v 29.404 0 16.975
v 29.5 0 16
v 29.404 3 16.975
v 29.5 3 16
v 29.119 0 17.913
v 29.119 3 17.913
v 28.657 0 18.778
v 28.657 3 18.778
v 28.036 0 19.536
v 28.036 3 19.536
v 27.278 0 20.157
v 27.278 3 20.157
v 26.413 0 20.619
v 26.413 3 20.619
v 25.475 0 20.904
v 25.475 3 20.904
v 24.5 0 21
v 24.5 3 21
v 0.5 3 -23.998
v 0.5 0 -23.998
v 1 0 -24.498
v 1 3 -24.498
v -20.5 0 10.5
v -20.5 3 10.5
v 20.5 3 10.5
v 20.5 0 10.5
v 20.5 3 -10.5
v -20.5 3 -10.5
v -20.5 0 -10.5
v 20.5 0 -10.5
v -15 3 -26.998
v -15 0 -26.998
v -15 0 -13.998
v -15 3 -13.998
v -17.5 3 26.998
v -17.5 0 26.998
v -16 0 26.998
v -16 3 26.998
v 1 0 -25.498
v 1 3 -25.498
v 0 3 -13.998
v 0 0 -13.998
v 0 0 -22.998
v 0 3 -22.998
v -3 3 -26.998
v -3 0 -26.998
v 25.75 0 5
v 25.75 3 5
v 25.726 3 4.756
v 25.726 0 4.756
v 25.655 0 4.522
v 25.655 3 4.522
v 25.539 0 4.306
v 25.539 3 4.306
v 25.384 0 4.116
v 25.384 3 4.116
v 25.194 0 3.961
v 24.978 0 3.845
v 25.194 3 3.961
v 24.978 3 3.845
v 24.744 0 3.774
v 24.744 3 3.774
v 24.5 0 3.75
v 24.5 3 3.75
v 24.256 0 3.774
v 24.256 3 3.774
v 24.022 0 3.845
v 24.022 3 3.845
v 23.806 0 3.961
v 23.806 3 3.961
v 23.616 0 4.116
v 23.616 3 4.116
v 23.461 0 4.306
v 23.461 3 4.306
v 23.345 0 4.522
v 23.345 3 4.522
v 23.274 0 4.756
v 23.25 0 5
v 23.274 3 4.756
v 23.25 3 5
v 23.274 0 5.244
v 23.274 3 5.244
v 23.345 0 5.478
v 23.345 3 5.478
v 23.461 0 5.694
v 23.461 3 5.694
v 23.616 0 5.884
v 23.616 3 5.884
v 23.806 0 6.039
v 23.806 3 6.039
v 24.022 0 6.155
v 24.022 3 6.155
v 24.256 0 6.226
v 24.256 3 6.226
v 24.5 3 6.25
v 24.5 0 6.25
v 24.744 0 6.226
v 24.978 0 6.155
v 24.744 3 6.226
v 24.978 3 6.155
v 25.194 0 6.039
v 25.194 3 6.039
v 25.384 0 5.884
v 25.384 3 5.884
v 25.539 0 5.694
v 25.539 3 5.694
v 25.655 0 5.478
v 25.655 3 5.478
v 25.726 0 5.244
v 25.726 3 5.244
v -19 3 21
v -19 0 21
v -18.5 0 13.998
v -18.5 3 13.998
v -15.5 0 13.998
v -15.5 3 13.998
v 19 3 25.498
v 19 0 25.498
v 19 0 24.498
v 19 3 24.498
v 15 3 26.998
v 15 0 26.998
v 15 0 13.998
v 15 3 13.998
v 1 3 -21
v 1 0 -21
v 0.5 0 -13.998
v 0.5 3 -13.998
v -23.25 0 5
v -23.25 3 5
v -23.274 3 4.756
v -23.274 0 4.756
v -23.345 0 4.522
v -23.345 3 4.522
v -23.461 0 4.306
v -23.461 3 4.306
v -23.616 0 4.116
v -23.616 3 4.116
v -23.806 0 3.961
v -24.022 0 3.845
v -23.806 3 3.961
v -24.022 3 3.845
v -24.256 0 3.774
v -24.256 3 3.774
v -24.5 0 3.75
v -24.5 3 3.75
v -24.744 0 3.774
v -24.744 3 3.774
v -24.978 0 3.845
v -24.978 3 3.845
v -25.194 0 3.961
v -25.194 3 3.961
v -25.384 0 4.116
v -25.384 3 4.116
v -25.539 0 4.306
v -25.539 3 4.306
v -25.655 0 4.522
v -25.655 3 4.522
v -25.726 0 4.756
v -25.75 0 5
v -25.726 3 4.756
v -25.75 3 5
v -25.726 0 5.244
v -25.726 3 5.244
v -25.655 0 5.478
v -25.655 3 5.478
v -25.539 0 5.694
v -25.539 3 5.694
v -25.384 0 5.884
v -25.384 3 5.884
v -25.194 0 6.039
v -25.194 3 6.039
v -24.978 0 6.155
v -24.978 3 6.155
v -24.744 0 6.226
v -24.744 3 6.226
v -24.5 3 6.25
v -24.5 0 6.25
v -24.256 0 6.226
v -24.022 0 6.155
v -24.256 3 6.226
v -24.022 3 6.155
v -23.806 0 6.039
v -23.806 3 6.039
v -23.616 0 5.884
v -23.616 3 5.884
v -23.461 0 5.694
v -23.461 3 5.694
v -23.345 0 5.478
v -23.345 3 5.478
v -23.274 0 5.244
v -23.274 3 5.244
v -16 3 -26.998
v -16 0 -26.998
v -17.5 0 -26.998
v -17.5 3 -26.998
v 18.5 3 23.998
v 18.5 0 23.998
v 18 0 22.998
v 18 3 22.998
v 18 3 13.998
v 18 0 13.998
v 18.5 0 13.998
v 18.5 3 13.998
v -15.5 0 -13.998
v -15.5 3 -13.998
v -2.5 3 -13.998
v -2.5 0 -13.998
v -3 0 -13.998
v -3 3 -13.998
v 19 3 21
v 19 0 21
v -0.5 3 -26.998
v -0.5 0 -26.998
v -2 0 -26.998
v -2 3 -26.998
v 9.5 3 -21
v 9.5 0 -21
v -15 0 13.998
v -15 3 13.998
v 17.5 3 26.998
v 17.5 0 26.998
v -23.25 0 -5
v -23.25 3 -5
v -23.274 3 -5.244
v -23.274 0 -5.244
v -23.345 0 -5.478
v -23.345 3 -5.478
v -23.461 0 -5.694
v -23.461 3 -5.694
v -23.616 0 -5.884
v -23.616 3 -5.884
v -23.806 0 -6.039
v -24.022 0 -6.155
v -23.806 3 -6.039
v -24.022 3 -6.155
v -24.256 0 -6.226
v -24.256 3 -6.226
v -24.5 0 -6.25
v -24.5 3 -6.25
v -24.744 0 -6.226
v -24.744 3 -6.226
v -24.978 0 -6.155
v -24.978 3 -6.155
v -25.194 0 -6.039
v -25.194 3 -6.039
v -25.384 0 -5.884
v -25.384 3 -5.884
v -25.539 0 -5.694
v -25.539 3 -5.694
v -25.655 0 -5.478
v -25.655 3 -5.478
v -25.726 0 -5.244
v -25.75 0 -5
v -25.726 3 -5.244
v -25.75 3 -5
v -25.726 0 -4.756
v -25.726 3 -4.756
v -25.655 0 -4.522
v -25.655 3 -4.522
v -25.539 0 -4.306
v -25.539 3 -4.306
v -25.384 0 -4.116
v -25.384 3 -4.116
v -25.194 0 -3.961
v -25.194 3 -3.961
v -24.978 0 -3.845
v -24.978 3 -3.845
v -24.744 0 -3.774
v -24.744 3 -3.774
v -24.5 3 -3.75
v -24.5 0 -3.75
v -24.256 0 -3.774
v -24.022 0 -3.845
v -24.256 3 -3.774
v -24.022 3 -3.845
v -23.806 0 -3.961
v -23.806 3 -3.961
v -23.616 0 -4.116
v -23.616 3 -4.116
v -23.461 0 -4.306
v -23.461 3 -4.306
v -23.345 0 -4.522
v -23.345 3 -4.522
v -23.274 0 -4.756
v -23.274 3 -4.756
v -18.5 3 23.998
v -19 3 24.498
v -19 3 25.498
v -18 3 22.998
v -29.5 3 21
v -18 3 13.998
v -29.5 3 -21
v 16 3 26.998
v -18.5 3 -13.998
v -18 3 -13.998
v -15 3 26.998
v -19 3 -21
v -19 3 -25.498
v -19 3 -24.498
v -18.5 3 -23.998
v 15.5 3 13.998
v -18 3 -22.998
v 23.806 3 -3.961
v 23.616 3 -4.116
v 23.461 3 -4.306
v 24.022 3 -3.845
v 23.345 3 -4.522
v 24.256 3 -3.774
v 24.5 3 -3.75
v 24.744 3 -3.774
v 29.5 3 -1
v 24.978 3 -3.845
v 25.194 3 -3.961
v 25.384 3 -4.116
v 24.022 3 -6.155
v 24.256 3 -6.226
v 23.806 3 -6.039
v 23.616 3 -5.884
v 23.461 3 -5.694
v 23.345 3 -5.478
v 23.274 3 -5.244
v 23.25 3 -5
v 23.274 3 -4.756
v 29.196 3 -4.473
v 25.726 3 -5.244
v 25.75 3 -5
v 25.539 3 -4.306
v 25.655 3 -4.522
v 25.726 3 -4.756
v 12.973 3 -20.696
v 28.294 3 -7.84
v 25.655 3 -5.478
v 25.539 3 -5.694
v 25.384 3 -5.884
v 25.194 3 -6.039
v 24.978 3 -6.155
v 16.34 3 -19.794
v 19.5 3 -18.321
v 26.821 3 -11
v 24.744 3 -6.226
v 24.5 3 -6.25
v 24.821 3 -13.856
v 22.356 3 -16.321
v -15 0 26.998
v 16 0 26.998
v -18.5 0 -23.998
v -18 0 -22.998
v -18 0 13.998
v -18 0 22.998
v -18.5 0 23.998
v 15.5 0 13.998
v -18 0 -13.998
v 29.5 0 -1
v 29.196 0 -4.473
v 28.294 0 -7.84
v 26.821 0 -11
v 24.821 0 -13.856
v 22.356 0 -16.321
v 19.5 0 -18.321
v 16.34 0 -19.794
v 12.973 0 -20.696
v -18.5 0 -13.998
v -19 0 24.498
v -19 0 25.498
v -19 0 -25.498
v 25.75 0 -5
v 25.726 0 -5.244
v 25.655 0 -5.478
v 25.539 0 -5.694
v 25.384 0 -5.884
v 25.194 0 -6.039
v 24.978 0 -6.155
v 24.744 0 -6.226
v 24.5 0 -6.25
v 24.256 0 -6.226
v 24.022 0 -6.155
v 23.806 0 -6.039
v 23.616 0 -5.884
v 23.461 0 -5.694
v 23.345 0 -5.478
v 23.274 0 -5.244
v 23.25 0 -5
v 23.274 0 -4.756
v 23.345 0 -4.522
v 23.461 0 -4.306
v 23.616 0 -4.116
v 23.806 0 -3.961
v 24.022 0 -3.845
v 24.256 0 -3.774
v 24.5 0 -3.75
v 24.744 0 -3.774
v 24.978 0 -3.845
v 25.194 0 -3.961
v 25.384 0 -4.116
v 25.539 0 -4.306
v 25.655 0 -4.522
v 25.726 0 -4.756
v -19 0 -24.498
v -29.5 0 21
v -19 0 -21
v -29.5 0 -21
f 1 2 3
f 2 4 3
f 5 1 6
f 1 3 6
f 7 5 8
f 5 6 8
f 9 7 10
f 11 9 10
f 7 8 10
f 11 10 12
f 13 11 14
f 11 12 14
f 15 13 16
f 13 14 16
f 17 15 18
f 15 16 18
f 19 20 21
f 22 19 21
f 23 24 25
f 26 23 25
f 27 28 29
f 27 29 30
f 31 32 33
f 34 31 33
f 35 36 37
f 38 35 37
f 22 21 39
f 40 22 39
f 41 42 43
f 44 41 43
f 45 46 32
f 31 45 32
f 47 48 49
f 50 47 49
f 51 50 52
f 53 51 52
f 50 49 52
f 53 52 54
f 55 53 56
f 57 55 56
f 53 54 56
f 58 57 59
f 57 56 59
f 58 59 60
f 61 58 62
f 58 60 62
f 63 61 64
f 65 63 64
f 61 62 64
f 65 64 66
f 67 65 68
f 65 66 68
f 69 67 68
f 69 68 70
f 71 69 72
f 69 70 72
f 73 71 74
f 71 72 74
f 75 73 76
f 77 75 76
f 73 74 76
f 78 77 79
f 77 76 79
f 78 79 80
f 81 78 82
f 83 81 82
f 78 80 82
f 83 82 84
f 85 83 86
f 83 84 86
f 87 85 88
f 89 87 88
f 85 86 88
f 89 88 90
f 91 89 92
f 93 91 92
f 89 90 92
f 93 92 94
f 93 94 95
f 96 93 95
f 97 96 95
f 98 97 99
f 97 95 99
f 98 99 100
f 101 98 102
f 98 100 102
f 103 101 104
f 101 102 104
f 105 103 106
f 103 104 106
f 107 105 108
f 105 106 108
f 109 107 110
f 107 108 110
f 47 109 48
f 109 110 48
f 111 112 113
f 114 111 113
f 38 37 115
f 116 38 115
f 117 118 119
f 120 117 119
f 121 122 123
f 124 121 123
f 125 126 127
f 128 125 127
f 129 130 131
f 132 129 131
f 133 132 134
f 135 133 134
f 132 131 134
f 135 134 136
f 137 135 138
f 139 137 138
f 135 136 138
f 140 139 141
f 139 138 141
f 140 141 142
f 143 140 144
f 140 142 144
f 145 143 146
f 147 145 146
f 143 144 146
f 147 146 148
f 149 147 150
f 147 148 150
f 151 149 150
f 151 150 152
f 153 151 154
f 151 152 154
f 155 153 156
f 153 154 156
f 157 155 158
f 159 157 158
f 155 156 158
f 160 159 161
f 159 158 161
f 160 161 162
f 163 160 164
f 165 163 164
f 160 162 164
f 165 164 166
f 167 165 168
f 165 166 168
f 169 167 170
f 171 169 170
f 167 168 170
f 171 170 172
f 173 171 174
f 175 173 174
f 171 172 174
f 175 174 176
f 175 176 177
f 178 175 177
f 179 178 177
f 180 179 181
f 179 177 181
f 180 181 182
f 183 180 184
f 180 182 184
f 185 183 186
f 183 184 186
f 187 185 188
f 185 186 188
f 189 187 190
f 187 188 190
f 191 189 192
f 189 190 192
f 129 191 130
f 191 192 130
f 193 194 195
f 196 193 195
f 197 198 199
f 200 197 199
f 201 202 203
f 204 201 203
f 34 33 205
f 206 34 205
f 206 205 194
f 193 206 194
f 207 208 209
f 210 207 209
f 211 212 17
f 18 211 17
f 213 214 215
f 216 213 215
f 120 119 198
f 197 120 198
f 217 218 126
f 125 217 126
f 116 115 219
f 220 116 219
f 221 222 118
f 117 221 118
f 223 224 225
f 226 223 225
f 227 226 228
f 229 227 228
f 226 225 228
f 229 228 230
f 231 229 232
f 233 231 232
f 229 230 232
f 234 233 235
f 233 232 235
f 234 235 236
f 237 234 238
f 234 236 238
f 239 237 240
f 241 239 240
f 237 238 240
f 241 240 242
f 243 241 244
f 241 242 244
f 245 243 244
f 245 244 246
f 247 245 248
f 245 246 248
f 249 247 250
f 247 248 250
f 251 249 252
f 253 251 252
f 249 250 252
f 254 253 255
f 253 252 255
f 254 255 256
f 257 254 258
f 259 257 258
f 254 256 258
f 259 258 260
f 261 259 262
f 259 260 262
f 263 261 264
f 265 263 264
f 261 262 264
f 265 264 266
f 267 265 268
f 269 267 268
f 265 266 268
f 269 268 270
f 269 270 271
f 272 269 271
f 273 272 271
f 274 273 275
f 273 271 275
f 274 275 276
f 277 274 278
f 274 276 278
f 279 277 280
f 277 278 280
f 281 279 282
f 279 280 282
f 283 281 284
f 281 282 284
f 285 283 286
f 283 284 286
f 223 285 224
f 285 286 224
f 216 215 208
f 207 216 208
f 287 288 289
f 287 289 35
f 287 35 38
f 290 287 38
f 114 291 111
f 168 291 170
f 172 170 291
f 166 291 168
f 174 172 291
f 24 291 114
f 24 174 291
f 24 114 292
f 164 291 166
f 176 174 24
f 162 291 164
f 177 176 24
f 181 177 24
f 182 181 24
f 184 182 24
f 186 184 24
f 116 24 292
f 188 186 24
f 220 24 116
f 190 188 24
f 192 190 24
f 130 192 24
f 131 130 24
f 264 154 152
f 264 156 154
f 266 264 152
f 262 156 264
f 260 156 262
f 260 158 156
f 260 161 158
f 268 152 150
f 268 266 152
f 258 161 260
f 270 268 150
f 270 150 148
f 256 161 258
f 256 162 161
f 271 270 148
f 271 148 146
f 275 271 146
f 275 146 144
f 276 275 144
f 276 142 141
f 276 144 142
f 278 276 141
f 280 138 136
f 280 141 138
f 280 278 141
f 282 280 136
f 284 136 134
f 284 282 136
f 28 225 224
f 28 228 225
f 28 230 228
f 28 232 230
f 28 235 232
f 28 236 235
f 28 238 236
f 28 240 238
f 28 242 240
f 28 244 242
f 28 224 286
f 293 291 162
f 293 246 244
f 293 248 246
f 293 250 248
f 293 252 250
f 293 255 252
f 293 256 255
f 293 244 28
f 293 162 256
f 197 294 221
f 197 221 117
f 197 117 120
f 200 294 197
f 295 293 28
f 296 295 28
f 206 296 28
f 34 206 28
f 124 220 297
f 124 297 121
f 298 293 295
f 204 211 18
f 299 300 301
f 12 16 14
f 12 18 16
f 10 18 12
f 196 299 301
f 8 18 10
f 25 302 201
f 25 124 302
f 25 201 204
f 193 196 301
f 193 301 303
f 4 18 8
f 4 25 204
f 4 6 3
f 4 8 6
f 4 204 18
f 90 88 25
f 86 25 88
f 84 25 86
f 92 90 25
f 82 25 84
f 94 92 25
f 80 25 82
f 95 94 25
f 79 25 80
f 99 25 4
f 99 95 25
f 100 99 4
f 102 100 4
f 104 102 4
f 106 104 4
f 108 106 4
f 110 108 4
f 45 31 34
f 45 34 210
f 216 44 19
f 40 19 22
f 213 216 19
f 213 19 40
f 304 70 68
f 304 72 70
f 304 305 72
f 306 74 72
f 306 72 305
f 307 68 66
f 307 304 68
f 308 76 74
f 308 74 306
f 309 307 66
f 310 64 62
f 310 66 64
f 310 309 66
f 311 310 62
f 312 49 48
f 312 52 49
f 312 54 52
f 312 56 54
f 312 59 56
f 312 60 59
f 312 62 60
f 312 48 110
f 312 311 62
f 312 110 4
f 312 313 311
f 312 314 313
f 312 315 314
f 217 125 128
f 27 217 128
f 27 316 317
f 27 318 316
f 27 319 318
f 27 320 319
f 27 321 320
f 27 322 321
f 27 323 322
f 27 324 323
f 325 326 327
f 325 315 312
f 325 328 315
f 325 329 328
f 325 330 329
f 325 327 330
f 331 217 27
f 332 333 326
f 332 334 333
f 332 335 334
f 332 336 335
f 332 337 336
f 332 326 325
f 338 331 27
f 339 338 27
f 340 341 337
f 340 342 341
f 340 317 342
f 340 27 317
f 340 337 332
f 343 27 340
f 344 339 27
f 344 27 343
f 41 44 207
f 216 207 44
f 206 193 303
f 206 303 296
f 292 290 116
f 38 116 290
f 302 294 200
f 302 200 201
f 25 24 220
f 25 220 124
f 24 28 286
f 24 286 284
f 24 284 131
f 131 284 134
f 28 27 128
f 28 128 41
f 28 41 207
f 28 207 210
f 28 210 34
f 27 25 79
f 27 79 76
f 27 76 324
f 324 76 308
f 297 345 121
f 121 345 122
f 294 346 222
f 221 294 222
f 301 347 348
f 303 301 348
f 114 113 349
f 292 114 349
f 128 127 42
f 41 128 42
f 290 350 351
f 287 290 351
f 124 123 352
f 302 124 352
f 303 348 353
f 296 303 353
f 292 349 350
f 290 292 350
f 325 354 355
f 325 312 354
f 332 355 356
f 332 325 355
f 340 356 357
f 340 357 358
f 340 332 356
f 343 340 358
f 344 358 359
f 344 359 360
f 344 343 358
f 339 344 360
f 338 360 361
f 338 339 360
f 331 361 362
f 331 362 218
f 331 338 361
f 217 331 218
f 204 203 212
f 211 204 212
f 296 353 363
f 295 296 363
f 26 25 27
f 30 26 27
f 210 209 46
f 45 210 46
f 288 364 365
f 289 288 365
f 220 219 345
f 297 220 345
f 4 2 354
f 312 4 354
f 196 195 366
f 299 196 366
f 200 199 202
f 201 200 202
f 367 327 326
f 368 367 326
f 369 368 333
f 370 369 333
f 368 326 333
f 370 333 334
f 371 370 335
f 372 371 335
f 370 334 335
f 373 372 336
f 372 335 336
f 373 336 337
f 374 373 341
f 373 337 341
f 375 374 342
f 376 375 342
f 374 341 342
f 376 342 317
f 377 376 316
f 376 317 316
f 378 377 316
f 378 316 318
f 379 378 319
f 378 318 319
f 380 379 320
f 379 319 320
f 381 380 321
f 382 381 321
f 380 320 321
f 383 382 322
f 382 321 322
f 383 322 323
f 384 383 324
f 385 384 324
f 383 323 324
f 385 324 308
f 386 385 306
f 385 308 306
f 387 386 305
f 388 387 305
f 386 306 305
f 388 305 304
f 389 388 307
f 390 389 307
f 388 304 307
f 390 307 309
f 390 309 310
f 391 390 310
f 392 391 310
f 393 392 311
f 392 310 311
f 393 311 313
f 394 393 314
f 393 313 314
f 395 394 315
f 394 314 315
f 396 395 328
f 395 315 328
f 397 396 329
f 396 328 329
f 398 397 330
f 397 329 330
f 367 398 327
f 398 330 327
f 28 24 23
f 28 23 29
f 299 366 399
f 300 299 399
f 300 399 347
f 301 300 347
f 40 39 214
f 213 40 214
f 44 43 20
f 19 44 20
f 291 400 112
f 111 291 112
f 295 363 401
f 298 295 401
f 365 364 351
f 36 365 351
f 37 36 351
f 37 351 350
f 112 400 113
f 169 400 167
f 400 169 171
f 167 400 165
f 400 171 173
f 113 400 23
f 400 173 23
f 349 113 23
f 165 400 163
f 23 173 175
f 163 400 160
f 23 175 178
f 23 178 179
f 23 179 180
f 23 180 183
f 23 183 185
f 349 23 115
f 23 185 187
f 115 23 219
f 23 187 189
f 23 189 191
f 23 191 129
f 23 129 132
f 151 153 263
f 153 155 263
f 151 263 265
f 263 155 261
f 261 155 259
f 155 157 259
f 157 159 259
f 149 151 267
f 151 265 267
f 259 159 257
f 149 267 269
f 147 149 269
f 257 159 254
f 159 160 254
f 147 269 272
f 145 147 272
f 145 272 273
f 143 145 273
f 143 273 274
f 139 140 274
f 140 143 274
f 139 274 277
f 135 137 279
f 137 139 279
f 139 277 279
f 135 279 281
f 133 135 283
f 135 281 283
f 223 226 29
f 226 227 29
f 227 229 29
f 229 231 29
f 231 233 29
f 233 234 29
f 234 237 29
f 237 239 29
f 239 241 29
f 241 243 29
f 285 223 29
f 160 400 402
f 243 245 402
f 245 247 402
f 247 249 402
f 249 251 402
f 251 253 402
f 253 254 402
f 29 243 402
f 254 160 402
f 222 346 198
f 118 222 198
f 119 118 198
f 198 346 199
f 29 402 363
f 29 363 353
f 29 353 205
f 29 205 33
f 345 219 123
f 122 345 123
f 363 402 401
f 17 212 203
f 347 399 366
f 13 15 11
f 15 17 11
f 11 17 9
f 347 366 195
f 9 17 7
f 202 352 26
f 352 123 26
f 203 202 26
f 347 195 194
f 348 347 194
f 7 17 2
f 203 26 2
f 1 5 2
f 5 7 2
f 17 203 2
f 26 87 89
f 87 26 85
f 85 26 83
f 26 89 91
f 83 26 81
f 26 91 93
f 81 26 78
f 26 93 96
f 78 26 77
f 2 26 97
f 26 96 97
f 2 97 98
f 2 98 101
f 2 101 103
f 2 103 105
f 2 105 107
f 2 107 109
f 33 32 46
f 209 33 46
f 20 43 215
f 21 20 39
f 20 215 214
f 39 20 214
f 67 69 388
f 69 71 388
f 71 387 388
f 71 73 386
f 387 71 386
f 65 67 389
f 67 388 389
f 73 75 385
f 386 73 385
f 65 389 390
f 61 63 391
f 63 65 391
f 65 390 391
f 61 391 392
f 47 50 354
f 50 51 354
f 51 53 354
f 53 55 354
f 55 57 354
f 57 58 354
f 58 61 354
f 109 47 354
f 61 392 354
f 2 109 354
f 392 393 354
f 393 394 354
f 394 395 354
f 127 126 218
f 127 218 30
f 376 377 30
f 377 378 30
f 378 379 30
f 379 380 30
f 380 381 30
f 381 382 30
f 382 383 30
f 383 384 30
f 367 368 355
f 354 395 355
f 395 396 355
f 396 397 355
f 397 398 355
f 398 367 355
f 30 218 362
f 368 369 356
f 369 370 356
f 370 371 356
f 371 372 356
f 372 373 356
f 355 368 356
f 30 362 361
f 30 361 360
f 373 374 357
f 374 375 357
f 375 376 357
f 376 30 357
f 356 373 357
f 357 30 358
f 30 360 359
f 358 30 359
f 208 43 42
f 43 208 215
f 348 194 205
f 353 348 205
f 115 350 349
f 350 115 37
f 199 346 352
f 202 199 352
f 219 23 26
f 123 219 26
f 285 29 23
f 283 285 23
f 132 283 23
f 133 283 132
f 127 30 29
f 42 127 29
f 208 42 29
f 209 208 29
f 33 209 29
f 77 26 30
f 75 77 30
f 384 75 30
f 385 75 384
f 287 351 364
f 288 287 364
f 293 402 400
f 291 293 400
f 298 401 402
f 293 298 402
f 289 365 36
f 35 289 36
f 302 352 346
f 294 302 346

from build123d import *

# Parameters (mm, degrees)
BOSS_EXTRUDE4_DEPTH = 3
SKETCH7_R           = 1.25
SKETCH7_W           = 41
SKETCH7_H           = 21
CUT_EXTRUDE1_DEPTH  = 3
FILLET2_R           = 20
FILLET3_R           = 5


with BuildPart() as part:
    # Sketch1 → Boss-Extrude4 (new body)
    with BuildSketch(Plane(origin=(0, 0, 0), x_dir=(1, 0, 0), z_dir=(0, 1, 0))):
        Polygon((19, -21), (29.5, -21), (29.5, 21), (1, 21), (0.5, 13.997828908), (0, 13.997828908), (0, 22.997828908), (0.5, 23.997828908), (1, 24.497828908), (1, 25.497828908), (-0.5, 26.997828908), (-2, 26.997828908), (-2.5, 13.997828908), (-3, 13.997828908), (-3, 26.997828908), (-15, 26.997828908), (-15, 13.997828908), (-15.5, 13.997828908), (-16, 26.997828908), (-17.5, 26.997828908), (-19, 25.497828908), (-19, 24.497828908), (-18.5, 23.997828908), (-18, 22.997828908), (-18, 13.997828908), (-18.5, 13.997828908), (-19, 21), (-29.5, 21), (-29.5, -21), (-19, -21), (-18.5, -13.997828908), (-18, -13.997828908), (-18, -22.997828908), (-18.5, -23.997828908), (-19, -24.497828908), (-19, -25.497828908), (-17.5, -26.997828908), (-16, -26.997828908), (-15.5, -13.997828908), (-15, -13.997828908), (-15, -26.997828908), (15, -26.997828908), (15, -13.997828908), (15.5, -13.997828908), (16, -26.997828908), (17.5, -26.997828908), (19, -25.497828908), (19, -24.497828908), (18.5, -23.997828908), (18, -22.997828908), (18, -13.997828908), (18.5, -13.997828908), align=None)
    extrude(amount=BOSS_EXTRUDE4_DEPTH)

    # Sketch7 → Cut-Extrude1 (cut)
    with BuildSketch(Plane(origin=(0, 3, 0), x_dir=(1, 0, 0), z_dir=(0, 1, 0))):
        with Locations((-24.5, 5)):
            Circle(SKETCH7_R)
        with Locations((-24.5, -5)):
            Circle(SKETCH7_R)
        with Locations((24.5, -5)):
            Circle(SKETCH7_R)
        with Locations((24.5, 5)):
            Circle(SKETCH7_R)
        Rectangle(SKETCH7_W, SKETCH7_H)
    extrude(amount=-CUT_EXTRUDE1_DEPTH, mode=Mode.SUBTRACT)

    # Fillet2
    fillet2_edges = [part.edges().sort_by_distance(p)[0] for p in [
        (29.5, 1.5, -21),
    ]]
    fillet(fillet2_edges, radius=FILLET2_R)

    # Fillet3
    fillet3_edges = [part.edges().sort_by_distance(p)[0] for p in [
        (29.5, 1.5, 21),
    ]]
    fillet(fillet3_edges, radius=FILLET3_R)


solid = part.part
